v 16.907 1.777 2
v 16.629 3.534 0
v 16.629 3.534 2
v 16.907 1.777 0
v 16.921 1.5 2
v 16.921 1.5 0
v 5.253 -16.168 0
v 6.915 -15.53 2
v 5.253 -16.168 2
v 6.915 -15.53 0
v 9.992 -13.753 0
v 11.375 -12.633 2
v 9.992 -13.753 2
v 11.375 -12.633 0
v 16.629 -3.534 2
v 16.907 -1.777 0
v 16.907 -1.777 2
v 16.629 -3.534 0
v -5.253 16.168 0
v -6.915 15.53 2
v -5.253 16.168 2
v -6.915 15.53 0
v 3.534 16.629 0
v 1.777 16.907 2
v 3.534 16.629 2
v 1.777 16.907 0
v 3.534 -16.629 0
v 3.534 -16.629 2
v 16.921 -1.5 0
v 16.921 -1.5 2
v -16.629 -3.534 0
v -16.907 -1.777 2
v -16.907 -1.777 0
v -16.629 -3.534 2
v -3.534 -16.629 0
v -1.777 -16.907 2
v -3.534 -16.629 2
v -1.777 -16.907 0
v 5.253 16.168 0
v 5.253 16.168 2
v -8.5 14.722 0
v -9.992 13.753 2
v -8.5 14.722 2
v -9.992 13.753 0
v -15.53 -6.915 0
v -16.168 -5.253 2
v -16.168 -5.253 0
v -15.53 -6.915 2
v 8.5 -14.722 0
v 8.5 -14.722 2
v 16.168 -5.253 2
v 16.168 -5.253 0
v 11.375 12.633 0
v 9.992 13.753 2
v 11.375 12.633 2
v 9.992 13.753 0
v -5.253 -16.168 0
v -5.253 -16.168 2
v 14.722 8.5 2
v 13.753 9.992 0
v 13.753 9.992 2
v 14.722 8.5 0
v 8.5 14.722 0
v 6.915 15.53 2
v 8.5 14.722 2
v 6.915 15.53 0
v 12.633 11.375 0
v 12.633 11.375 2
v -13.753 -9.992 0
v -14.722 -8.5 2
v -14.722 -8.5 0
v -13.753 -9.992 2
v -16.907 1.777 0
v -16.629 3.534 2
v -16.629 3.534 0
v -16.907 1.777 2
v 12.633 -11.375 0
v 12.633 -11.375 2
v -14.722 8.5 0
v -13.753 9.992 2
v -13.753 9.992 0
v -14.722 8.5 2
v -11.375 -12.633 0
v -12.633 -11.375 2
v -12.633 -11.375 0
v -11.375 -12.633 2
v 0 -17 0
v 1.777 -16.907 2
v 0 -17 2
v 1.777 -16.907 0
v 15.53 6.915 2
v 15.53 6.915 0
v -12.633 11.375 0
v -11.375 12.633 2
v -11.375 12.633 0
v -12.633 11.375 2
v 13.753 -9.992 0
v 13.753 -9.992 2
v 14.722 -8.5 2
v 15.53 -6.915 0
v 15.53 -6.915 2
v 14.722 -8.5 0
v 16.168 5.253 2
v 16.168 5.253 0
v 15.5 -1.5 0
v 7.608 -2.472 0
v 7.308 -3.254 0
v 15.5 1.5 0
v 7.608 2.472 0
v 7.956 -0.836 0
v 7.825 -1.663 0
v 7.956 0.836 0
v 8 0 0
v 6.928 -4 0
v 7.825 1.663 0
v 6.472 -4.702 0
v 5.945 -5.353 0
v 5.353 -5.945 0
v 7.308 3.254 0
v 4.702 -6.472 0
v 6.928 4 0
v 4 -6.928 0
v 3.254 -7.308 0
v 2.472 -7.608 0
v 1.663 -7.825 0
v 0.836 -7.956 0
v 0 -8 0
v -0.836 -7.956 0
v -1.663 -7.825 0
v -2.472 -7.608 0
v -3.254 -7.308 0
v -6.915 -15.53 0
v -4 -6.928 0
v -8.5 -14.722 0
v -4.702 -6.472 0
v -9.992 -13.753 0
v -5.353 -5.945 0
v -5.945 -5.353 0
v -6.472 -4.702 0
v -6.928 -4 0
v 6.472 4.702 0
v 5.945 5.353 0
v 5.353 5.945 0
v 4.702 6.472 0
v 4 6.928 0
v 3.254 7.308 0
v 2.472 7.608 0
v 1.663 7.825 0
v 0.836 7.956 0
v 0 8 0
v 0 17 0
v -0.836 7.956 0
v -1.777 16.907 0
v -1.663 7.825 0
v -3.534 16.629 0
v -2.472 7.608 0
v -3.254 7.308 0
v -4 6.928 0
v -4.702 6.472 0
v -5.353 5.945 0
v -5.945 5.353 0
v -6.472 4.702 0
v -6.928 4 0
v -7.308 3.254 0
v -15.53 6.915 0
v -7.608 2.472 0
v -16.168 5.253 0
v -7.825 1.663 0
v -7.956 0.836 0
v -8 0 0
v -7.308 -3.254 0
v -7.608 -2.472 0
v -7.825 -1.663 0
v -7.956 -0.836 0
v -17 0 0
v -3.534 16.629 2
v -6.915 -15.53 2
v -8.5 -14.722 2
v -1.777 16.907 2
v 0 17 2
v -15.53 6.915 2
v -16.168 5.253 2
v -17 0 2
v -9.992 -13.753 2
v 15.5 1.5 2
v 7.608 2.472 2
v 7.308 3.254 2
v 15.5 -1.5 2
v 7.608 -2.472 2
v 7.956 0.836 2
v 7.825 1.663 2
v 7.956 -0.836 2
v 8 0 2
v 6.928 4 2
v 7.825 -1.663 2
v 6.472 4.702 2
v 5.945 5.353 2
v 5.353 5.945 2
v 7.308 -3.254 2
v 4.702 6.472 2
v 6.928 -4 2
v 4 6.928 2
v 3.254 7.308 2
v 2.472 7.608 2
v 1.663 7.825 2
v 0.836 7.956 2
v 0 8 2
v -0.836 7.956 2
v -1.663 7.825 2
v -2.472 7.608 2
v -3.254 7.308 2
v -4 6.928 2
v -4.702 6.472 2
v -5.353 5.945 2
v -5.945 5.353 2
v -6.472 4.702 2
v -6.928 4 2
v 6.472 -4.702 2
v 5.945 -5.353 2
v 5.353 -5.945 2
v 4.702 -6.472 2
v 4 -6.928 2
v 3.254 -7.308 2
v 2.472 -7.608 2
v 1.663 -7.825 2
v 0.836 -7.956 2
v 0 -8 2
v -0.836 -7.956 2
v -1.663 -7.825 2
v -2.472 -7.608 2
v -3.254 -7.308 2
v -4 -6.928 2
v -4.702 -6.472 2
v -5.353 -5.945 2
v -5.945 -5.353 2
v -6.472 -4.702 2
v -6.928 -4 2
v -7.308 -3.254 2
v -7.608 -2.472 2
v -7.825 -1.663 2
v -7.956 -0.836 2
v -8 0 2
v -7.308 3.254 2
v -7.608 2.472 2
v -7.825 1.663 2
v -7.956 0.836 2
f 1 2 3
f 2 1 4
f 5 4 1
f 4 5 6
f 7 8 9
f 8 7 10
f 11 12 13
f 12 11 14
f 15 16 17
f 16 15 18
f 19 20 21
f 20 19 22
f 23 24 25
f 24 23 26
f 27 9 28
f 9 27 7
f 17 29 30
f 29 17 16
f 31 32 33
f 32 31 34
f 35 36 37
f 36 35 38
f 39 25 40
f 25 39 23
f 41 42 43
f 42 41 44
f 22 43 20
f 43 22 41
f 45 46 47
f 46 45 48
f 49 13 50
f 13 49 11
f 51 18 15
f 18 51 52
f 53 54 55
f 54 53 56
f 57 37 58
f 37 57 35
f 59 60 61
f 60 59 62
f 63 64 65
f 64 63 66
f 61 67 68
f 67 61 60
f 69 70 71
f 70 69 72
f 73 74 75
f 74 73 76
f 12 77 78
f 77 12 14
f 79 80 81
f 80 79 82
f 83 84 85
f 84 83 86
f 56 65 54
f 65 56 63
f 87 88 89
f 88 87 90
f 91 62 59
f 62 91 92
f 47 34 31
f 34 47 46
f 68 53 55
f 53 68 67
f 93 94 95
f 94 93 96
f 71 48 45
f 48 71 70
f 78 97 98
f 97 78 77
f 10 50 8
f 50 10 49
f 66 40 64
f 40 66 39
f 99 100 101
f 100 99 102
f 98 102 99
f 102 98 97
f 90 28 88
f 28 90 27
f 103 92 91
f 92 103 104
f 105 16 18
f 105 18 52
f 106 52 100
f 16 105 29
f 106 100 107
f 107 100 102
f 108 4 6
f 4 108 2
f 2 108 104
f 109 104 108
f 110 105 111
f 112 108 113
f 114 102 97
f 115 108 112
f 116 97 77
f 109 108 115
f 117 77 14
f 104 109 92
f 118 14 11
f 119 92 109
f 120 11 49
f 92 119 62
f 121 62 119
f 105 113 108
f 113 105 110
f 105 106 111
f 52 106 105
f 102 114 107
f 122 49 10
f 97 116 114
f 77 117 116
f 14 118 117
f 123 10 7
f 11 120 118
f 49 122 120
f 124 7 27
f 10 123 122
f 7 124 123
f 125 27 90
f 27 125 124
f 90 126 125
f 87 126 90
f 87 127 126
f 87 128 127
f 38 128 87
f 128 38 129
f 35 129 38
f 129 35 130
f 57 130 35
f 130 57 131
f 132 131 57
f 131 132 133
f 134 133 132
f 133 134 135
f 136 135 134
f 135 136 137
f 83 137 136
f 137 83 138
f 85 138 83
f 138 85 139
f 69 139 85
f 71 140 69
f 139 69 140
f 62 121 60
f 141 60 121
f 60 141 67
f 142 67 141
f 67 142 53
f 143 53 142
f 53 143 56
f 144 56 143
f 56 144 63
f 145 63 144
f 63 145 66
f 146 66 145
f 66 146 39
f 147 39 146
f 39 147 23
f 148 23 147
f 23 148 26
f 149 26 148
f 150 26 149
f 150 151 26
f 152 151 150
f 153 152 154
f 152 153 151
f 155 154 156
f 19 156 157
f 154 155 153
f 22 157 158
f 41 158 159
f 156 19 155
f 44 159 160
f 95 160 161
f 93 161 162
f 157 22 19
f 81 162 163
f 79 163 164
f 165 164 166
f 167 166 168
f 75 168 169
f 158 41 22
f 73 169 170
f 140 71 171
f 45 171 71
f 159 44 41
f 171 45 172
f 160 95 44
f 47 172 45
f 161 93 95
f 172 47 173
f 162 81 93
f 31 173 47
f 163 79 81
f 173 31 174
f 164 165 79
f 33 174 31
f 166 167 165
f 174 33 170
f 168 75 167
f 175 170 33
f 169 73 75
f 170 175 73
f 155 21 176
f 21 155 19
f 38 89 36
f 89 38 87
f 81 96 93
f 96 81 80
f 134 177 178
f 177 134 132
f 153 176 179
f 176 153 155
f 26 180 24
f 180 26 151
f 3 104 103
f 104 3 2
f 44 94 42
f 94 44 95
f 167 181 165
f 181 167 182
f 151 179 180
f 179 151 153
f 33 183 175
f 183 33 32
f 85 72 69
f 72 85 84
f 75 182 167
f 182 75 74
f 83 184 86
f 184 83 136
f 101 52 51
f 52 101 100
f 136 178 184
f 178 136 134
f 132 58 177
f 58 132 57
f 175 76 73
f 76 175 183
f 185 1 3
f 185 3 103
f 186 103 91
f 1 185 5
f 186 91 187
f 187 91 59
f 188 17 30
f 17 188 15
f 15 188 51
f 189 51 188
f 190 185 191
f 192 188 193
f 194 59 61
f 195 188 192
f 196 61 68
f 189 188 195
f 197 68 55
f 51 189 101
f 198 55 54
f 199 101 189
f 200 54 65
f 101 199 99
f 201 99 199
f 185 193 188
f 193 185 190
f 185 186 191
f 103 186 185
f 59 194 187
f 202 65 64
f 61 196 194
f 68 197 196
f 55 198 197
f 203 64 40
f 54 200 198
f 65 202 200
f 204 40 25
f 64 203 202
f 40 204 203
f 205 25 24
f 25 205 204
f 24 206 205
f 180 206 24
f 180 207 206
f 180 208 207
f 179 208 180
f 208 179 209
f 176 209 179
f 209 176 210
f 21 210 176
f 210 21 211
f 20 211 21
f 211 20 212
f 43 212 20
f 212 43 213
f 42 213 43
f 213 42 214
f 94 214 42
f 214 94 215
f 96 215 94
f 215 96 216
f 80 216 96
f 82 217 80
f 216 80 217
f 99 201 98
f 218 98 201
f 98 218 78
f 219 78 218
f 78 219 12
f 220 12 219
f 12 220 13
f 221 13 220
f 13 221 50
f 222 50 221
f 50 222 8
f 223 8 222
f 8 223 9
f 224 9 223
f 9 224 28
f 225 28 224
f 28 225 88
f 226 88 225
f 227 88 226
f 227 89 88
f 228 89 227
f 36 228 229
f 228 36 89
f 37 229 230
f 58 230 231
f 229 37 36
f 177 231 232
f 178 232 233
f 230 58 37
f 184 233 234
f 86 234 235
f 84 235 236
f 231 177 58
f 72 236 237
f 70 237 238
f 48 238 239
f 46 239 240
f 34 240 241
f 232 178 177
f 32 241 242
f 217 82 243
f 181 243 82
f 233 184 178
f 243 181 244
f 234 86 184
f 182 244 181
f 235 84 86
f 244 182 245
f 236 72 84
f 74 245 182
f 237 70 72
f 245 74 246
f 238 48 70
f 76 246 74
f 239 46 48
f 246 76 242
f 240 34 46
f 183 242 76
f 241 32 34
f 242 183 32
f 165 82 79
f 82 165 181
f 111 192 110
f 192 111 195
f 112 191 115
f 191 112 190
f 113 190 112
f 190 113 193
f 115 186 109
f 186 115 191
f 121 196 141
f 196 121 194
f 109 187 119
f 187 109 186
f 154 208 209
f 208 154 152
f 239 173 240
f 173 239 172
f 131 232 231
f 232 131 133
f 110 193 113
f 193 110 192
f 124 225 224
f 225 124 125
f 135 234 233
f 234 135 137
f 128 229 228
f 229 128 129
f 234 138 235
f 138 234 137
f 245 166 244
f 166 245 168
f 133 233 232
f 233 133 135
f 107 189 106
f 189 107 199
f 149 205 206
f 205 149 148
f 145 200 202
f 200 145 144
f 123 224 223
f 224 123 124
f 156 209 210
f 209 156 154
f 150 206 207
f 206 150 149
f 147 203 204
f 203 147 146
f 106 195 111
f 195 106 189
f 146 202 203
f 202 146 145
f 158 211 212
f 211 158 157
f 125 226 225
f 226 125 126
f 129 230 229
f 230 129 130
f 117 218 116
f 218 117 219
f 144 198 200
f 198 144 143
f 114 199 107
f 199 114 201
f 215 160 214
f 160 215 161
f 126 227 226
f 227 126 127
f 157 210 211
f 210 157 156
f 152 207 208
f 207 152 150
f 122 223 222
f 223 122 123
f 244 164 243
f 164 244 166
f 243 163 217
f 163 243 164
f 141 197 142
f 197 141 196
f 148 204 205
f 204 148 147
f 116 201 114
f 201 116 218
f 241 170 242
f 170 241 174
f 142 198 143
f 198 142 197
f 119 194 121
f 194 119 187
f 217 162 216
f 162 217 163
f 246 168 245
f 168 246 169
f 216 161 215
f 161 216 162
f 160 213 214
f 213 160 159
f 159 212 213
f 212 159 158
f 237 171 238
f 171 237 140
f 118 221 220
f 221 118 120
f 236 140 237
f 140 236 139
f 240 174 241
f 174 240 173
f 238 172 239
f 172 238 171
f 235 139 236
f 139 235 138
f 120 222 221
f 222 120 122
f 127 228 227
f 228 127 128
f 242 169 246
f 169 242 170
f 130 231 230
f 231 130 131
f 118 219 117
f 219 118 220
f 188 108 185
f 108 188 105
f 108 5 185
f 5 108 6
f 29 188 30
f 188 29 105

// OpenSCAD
// External retaining ring with installation gap.
$fn = 60;
eps = 0.02;
shaft_d = 16;
outer_d = 34;
thickness = 2;
gap = 3;
difference() {
    cylinder(d = outer_d, h = thickness);
    translate([0, 0, -eps]) cylinder(d = shaft_d, h = thickness + 2 * eps);
    translate([outer_d / 2 - gap / 2, -gap / 2, -eps]) cube([gap + eps, gap, thickness + 2 * eps]);
}
